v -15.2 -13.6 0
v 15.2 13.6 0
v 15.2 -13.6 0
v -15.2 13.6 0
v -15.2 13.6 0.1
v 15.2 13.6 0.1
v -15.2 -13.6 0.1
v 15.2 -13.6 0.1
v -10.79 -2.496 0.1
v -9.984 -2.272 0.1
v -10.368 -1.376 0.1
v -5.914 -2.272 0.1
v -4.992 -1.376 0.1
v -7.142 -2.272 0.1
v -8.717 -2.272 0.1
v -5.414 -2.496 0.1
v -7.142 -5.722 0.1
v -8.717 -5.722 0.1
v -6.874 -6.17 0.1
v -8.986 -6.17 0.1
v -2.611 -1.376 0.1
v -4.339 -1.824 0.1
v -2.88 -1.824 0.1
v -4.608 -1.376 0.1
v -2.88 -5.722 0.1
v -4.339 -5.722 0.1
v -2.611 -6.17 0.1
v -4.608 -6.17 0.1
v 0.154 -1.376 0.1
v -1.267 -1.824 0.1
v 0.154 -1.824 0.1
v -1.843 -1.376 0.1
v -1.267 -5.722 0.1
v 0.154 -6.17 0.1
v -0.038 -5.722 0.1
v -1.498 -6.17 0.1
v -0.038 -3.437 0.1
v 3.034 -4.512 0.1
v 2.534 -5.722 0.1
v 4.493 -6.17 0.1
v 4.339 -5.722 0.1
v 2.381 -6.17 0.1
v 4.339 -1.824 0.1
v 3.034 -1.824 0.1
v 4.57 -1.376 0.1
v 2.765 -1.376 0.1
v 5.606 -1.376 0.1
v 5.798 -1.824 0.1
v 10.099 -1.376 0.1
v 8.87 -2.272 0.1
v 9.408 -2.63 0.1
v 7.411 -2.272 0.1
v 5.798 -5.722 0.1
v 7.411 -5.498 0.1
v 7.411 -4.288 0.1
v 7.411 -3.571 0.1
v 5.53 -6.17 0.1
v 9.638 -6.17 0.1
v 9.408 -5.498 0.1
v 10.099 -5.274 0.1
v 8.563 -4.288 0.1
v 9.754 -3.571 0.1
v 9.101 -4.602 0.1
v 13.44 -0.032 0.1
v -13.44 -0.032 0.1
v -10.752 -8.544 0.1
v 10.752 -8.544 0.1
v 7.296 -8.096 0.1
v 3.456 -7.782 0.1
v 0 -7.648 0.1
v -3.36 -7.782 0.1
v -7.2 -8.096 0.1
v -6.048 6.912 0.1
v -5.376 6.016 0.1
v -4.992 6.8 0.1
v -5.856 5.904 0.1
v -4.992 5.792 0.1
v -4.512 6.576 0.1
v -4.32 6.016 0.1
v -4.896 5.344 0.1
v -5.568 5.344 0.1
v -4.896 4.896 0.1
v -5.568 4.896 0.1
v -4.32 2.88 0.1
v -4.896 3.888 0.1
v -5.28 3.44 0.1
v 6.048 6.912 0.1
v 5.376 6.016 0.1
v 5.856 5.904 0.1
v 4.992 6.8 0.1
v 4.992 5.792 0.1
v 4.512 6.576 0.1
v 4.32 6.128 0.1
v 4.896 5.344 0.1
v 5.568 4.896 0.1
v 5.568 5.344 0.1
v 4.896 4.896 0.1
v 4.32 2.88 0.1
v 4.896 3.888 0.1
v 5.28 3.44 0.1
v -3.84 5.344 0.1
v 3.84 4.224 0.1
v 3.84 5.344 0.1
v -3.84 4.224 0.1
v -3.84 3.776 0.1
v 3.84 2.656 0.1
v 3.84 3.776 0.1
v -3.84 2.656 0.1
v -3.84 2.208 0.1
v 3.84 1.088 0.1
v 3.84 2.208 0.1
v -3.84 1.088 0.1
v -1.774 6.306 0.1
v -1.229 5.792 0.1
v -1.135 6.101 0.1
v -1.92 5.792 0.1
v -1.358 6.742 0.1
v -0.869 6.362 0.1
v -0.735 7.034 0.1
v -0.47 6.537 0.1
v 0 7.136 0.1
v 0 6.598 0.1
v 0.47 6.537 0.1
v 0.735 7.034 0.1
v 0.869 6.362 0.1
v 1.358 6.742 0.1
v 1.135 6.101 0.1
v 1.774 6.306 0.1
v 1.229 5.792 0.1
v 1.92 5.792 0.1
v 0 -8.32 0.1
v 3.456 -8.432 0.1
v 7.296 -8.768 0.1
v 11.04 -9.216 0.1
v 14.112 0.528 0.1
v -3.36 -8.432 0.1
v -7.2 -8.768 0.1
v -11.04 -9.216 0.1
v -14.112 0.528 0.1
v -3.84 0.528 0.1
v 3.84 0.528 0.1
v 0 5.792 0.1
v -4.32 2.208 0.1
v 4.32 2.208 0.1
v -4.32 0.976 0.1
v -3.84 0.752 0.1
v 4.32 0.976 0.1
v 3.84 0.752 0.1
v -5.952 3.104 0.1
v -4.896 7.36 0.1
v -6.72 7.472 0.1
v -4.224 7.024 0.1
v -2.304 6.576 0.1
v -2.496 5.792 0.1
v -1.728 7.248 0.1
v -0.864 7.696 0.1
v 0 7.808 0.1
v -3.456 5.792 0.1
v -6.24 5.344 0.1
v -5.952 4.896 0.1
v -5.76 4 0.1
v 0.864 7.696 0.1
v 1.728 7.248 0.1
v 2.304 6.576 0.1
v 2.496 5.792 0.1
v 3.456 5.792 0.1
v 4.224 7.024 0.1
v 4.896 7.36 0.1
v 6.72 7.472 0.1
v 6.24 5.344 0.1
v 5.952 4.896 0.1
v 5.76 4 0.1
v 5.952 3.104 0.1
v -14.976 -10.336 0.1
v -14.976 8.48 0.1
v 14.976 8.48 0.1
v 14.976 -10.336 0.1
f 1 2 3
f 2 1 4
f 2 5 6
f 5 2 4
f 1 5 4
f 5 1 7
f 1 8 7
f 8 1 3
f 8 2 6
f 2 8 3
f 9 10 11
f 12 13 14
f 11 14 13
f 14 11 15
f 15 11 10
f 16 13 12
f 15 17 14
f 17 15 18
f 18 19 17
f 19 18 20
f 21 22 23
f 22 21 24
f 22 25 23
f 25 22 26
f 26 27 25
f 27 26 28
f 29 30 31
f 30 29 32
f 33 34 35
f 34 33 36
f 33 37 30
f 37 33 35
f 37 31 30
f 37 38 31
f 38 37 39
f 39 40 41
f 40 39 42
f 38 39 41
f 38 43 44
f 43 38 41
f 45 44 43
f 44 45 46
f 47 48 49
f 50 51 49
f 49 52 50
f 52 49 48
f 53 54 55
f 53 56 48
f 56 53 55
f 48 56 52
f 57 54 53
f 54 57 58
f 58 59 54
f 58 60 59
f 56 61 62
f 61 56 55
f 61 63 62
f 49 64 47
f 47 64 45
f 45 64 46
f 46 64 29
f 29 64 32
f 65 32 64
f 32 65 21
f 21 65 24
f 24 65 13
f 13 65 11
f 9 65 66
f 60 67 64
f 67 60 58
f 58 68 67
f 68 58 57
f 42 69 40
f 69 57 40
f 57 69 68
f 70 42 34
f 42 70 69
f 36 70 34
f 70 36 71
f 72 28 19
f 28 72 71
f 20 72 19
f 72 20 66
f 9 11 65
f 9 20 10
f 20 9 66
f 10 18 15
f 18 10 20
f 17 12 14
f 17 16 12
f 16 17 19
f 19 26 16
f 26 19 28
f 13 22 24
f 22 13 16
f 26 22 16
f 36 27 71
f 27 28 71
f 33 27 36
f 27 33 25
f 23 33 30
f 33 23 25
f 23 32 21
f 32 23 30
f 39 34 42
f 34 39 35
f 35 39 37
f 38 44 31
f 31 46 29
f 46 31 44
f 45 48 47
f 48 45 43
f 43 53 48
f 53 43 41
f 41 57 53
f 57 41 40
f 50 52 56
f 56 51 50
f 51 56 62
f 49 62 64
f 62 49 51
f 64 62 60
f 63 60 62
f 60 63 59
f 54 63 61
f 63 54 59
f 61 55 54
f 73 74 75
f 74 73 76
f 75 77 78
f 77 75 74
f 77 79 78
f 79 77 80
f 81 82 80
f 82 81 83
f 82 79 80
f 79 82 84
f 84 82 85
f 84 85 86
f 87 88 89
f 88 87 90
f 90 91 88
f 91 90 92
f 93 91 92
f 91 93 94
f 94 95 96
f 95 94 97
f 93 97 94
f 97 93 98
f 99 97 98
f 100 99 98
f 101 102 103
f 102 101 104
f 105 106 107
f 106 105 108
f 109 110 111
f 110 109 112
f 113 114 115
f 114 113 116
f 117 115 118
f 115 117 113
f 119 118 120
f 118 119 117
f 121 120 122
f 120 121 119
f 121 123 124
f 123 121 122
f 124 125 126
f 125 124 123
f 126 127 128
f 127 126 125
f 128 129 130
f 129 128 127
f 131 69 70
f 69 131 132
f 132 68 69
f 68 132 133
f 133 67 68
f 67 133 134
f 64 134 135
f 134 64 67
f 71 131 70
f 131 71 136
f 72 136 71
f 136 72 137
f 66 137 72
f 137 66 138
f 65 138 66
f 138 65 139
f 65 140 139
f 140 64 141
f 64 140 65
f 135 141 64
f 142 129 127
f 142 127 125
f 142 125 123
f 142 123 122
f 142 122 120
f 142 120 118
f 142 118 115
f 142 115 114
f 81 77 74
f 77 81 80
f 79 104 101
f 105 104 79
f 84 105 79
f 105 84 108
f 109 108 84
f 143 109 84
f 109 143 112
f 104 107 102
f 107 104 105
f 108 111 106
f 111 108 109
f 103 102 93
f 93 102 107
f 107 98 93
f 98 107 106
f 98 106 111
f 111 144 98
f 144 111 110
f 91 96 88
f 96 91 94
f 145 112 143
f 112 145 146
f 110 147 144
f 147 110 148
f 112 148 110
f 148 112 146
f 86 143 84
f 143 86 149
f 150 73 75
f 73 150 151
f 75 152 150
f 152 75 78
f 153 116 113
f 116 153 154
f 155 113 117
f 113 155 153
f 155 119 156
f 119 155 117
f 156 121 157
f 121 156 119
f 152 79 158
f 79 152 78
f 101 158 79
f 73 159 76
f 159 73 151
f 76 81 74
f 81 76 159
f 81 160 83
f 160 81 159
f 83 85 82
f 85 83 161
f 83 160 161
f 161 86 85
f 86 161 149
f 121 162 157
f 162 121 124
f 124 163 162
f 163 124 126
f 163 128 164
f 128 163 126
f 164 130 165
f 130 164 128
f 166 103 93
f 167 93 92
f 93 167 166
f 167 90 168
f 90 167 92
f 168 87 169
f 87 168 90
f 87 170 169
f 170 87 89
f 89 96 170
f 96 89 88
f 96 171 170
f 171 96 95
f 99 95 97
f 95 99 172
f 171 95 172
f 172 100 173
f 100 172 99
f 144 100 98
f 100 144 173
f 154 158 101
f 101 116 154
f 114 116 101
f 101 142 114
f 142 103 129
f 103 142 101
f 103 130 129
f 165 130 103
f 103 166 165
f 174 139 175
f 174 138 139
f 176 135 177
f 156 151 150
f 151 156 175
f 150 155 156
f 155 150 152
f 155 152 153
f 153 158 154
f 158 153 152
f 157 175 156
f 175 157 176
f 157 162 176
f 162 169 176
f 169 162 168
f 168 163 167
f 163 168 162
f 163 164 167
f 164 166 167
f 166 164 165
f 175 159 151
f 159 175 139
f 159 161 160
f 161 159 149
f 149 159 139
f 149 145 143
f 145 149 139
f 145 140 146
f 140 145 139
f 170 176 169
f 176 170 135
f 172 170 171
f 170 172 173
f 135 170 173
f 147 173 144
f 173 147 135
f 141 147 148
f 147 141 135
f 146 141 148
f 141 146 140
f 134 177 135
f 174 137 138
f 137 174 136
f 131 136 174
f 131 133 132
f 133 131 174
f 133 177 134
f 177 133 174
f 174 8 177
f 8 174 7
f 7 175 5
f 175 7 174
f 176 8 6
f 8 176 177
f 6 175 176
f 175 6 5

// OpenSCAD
use <../lib.scad>
use <../p/box5-12.scad>
use <s/22587s01.scad>
$fa=1; $fs=0.2;
function ldraw_lib__22587a(realsolid=false) = [
// 0 Sticker  3.4 x  3.8 with "TINE" Logo
// 0 Name: 22587a.dat
// 0 Author: J.C. Tchang [tchang]
// 0 !LDRAW_ORG Part UPDATE 2013-02
// 0 !LICENSE Licensed under CC BY 2.0 and CC BY 4.0 : see CAreadme.txt
// 
// 0 BFC CERTIFY CCW
  [0,"BFC","CERTIFY"],
  [0,"BFC","CCW"],
// 
// 0 !KEYWORDS Milk, set 1029
// 
// 0 !HISTORY 2007-12-10 [tchang] Used subpart and replace 4125514a
// 0 !HISTORY 2011-08-01 [tchang] Change title, used primitive box5-12, suppress Category
// 0 !HISTORY 2013-08-07 [MMR1988] Adjusted Subpart Origin, Updated Description and Keywords, Changed box Colour to 16
// 0 !HISTORY 2013-12-23 [PTadmin] Official Update 2013-02
// 
// 
// 1 16 0 -0.25 0 38 0 0 0 0.25 0 0 0 34 box5-12.dat
  [1,16,0,-0.25,0,38,0,0,0,0.25,0,0,0,34, ldraw_lib__box5_12(realsolid)],
// 0 //
// 1 15 0 -0.25 -2.32 3.2 0 0 0 1 0 0 0 3.2 s\22587s01.dat
  [1,15,0,-0.25,-2.32,3.2,0,0,0,1,0,0,0,3.2, ldraw_lib__s__22587s01(realsolid)],
// 0 //
// 4 15 -38 -0.25 -34 38 -0.25 -34 37.44 -0.25 -25.84 -37.44 -0.25 -25.84
  [4,15,-38,-0.25,-34,38,-0.25,-34,37.44,-0.25,-25.84,-37.44,-0.25,-25.84],
// 4 15 -37.44 -0.25 -25.84 -37.44 -0.25 21.2 -38 -0.25 34 -38 -0.25 -34
  [4,15,-37.44,-0.25,-25.84,-37.44,-0.25,21.2,-38,-0.25,34,-38,-0.25,-34],
// 4 15 38 -0.25 -34 38 -0.25 34 37.44 -0.25 21.2 37.44 -0.25 -25.84
  [4,15,38,-0.25,-34,38,-0.25,34,37.44,-0.25,21.2,37.44,-0.25,-25.84],
// 4 15 -37.44 -0.25 21.2 37.44 -0.25 21.2 38 -0.25 34 -38 -0.25 34
  [4,15,-37.44,-0.25,21.2,37.44,-0.25,21.2,38,-0.25,34,-38,-0.25,34],
];
module ldraw_lib__22587a(step=0, col=false, unit=2/5, alt=false, line=0.2, solid=!$preview)
    makepoly(ldraw_lib__22587a(solid), step=step, col=col, unit=unit, alt=alt, line=line, solid=solid);
ldraw_lib__22587a(line=0.2);
